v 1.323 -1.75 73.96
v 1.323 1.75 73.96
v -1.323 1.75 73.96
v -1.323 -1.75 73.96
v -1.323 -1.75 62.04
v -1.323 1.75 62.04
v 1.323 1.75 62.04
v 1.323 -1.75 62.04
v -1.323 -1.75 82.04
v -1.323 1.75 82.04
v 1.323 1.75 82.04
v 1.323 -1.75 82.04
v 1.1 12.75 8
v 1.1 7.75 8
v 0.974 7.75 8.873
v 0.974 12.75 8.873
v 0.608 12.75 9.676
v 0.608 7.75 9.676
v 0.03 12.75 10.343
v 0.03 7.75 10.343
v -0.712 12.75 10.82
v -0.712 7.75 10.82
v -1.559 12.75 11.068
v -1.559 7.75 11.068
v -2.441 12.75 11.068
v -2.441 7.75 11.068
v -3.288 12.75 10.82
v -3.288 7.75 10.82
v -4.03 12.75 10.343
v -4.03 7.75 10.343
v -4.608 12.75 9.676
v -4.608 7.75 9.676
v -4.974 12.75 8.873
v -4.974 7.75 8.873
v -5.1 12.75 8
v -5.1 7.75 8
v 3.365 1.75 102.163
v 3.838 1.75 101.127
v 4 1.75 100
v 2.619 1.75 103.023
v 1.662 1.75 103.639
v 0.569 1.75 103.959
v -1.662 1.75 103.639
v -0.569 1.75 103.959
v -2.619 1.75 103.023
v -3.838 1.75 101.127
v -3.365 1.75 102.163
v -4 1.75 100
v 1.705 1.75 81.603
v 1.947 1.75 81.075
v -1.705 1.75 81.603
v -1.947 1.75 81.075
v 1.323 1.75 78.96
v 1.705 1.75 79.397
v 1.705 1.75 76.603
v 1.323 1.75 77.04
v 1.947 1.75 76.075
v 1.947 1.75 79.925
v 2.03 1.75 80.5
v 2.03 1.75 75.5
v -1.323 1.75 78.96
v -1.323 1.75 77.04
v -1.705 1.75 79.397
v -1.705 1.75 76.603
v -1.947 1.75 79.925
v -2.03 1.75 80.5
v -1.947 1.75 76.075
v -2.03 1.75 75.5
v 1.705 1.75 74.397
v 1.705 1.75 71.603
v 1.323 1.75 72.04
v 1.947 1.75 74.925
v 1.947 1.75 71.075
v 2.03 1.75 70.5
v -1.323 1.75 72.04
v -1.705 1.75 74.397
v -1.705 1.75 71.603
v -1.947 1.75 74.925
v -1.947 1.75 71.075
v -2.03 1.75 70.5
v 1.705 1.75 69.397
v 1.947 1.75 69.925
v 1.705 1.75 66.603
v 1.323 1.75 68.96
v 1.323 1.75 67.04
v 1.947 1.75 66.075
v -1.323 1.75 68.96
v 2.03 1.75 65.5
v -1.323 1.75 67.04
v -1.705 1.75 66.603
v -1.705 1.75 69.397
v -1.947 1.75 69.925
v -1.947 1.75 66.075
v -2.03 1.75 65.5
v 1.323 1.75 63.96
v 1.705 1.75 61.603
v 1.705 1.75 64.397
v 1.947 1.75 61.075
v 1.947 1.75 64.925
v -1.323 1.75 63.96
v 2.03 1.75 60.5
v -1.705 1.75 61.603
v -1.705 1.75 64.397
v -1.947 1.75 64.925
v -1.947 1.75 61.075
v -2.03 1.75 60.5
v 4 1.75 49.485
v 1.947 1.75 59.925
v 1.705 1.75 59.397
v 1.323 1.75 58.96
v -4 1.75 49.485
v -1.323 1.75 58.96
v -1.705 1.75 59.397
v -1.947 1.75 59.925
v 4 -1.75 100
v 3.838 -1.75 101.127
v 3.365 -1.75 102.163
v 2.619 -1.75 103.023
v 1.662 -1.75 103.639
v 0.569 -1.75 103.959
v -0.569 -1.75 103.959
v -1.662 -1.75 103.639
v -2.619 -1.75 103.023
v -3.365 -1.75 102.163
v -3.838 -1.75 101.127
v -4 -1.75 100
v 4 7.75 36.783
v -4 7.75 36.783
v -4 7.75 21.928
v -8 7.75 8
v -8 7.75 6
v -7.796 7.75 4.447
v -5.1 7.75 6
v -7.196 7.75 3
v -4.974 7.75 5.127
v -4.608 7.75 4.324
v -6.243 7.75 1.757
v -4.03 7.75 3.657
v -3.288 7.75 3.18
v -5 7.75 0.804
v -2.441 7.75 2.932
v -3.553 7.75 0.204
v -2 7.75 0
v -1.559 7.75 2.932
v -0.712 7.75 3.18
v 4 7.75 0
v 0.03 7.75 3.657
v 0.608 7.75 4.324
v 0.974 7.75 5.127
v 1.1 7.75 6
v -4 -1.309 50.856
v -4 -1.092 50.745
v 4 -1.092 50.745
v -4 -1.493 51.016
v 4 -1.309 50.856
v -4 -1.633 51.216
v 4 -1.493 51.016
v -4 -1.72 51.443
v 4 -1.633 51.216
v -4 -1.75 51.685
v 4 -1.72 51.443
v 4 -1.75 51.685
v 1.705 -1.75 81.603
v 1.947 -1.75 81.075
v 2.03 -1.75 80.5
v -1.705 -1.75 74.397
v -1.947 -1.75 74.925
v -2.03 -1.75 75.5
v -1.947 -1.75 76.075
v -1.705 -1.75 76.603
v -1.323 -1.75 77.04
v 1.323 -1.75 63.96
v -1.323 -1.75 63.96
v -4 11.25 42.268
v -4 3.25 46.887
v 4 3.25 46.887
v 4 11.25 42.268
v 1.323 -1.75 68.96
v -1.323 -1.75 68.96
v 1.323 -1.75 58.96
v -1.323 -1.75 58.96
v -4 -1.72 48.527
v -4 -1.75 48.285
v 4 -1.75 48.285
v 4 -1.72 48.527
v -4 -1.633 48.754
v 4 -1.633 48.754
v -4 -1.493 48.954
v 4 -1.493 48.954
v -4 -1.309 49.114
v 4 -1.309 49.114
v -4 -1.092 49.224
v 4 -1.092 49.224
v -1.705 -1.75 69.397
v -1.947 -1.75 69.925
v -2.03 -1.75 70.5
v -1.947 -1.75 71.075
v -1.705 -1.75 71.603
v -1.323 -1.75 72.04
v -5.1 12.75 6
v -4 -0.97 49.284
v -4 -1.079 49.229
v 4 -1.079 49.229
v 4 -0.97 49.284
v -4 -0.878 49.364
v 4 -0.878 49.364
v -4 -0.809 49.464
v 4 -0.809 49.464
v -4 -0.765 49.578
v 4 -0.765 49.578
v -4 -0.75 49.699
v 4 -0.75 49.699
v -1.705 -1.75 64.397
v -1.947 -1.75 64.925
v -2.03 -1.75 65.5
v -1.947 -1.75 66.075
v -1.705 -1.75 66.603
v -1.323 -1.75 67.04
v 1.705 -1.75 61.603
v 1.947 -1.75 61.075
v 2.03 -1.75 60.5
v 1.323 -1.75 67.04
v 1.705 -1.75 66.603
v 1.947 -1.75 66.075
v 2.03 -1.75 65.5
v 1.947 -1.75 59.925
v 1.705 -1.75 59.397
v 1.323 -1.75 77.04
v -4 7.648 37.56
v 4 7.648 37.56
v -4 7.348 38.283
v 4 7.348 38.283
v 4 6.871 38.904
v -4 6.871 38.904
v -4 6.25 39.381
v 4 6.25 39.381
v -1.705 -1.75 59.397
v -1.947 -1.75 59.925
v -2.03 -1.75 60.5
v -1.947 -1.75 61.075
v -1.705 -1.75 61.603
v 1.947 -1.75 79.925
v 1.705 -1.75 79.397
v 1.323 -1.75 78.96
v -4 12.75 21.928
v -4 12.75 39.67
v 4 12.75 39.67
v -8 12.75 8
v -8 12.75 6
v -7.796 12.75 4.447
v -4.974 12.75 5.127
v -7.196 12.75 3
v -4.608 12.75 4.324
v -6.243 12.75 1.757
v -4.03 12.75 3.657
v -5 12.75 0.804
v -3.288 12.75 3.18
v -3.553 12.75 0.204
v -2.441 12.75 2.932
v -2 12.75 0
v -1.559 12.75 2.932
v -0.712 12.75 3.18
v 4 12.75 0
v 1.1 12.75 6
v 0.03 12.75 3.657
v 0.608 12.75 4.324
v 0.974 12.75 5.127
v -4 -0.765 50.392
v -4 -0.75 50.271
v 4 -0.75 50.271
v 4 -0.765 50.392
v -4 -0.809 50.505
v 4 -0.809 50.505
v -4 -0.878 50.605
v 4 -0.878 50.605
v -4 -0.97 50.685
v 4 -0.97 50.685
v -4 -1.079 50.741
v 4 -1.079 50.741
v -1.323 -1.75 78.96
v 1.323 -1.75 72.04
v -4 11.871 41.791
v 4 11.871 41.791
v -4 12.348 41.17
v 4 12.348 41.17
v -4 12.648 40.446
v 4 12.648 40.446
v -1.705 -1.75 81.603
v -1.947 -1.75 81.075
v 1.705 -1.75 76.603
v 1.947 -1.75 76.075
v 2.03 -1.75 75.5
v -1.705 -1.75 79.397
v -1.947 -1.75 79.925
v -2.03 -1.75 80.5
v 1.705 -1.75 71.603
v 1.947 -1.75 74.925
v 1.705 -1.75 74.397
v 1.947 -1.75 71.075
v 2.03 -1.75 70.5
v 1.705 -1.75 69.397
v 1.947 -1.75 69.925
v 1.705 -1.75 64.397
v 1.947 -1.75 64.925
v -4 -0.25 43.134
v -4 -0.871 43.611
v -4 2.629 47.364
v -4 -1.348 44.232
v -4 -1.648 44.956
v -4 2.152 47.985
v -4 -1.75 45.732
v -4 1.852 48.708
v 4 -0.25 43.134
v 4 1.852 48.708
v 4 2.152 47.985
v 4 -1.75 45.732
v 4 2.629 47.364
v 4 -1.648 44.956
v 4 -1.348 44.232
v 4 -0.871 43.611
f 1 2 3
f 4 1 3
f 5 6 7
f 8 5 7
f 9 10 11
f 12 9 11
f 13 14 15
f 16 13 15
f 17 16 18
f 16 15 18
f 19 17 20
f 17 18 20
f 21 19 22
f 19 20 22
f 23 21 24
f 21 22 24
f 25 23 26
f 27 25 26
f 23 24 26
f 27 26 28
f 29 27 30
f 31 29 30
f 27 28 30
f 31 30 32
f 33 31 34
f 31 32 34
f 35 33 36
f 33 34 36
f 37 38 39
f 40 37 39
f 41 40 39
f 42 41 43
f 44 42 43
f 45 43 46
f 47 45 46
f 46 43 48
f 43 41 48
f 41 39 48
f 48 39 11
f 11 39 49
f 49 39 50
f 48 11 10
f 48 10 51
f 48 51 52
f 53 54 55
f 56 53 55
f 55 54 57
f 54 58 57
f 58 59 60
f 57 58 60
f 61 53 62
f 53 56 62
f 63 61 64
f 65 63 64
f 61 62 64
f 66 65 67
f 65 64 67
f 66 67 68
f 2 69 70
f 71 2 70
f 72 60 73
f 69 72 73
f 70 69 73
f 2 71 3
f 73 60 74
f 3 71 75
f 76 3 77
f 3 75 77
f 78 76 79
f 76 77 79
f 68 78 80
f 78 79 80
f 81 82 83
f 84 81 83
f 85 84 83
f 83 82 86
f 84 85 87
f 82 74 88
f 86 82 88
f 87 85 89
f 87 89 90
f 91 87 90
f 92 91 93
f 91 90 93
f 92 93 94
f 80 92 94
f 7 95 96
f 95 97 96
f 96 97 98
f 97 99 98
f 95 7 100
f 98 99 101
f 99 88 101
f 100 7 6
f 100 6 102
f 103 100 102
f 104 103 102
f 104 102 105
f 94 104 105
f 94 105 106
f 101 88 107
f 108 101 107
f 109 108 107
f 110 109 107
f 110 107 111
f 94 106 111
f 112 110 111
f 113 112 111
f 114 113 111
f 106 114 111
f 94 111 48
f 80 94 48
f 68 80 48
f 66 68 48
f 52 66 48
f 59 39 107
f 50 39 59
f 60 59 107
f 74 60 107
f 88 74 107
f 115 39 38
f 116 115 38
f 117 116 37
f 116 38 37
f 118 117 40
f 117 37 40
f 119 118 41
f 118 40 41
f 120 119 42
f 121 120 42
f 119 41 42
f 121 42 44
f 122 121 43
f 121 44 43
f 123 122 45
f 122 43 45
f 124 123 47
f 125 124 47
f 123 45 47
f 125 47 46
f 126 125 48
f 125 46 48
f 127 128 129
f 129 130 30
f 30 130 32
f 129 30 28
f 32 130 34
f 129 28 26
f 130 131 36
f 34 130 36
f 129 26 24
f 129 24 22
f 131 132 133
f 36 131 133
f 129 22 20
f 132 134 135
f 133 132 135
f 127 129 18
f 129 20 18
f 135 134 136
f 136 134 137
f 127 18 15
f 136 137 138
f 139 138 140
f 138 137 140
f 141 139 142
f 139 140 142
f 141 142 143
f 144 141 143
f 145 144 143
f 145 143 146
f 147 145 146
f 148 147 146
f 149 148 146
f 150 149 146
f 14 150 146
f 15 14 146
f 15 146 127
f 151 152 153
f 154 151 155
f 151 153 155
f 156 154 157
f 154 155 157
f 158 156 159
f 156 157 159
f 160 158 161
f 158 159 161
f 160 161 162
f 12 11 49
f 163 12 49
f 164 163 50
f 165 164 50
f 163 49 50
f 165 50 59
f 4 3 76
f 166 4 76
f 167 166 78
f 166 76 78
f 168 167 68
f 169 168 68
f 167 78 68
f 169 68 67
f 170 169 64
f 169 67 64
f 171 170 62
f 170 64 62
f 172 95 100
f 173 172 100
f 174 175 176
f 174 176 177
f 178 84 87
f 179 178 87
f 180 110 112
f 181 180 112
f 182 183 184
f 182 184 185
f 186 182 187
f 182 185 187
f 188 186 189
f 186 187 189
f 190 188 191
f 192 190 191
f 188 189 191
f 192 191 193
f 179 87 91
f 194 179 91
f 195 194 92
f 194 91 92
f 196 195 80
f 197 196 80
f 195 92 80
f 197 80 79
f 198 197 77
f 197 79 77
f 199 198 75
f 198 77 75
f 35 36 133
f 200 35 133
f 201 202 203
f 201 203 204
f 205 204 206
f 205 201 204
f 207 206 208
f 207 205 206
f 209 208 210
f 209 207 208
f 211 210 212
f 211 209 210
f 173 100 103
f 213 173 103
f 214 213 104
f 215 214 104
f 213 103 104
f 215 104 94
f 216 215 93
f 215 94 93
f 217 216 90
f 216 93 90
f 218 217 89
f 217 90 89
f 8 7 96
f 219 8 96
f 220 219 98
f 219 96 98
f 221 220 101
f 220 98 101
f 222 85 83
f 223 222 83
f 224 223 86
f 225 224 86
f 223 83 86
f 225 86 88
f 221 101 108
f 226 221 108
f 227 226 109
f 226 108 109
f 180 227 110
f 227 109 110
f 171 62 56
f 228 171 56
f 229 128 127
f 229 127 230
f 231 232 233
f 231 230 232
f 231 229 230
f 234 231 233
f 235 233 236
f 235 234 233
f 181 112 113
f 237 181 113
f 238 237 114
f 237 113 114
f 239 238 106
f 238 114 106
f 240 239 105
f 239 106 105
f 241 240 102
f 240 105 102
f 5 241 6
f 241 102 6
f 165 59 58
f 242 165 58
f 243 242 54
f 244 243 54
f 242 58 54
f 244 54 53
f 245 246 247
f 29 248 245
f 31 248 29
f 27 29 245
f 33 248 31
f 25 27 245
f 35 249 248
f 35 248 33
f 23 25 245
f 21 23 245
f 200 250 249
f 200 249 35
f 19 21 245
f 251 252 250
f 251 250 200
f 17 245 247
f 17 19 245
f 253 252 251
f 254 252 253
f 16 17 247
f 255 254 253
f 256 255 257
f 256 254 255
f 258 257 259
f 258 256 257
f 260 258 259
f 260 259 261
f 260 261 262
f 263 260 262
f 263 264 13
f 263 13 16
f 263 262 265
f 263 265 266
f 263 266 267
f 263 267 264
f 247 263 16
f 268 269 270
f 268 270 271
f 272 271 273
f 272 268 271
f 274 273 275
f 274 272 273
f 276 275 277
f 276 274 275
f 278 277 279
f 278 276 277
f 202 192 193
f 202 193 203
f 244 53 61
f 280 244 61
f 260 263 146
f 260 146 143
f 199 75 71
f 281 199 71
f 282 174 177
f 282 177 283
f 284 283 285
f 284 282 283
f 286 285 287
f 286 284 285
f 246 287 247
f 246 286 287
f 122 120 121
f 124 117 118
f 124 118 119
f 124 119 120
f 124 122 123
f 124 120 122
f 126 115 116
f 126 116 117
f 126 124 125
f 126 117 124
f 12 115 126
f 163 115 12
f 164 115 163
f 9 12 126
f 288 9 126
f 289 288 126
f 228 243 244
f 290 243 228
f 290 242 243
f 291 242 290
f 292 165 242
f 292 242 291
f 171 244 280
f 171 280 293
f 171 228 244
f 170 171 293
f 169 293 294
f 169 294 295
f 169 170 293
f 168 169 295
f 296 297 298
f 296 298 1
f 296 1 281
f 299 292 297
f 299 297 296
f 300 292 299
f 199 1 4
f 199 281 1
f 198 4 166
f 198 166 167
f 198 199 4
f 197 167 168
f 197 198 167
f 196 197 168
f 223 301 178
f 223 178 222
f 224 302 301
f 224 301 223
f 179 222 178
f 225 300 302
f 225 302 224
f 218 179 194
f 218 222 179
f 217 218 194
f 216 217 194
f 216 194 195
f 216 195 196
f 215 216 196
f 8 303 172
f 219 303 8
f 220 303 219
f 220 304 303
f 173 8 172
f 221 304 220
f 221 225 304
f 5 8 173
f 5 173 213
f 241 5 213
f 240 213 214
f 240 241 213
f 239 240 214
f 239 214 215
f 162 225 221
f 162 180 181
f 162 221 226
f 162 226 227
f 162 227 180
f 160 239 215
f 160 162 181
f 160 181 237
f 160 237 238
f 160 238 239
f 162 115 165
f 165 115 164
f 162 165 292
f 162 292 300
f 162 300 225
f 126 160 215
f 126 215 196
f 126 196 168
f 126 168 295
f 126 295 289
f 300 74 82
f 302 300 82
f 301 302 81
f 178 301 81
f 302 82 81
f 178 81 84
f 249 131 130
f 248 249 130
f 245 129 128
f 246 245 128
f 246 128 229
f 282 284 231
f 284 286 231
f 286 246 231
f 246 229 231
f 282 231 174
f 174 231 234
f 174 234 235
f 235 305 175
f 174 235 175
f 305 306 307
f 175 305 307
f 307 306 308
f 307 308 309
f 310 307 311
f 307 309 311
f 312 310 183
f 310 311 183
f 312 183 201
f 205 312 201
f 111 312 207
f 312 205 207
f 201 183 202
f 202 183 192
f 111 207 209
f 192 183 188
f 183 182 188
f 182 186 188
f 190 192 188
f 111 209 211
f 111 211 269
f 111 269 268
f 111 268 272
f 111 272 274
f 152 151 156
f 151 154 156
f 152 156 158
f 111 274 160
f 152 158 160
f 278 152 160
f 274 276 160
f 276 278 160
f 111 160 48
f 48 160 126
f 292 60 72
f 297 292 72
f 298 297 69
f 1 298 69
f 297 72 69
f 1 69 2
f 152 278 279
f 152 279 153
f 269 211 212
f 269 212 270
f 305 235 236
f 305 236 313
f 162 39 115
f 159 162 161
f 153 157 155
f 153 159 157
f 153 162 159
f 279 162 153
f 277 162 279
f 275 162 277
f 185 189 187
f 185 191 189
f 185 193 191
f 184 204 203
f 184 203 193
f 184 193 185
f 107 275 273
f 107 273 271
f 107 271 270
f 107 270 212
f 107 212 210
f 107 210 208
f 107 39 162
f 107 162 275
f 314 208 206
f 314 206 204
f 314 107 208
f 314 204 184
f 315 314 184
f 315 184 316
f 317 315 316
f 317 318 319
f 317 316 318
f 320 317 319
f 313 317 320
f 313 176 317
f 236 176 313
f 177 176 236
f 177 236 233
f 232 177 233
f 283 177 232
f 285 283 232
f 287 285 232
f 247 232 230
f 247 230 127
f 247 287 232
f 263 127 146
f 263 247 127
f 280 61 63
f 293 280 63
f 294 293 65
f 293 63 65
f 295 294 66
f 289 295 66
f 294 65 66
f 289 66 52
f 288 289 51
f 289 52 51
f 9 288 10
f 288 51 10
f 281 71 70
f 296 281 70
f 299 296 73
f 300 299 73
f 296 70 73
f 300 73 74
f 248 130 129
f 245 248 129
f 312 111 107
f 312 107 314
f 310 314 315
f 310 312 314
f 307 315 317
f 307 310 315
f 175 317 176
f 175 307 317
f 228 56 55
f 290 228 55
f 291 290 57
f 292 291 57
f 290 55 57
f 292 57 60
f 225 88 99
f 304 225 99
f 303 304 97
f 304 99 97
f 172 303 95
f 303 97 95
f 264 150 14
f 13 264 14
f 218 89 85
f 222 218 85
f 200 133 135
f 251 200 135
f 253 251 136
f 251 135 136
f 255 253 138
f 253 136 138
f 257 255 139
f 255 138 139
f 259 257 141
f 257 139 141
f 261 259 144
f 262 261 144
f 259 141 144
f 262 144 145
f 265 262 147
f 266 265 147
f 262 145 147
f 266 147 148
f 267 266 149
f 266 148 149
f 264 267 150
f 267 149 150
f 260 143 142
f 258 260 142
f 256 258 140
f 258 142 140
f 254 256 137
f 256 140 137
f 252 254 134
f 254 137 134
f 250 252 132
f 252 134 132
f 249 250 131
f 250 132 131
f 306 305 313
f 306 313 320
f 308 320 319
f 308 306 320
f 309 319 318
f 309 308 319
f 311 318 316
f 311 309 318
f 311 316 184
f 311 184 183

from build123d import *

# Parameters (mm, degrees)
SKETCH1_W                = 8
SKETCH1_H                = 3.5
BASE_DEPTH               = 50
SKETCH3_W                = 8
SKETCH3_H                = 3.5
SEGMENT1_DEPTH           = 50
BOSS_EXTRUDE7_DEPTH      = 3.5
BOSS_EXTRUDE9_DEPTH      = 11
CUT_EXTRUDE10_DEPTH      = 101.920760996
CUT_EXTRUDE10_DEPTH_BACK = 101.920760996
CUT_EXTRUDE9_DEPTH       = 102.52124162
CUT_EXTRUDE9_DEPTH_BACK  = 102.52124162
BOSS_EXTRUDE13_DEPTH     = 3.5
CUT_EXTRUDE12_DEPTH      = 10
CUT_EXTRUDE13_DEPTH      = 105.885652022
LPATTERN3_COUNT          = 5
LPATTERN3_PITCH          = 5
BOSS_EXTRUDE14_DEPTH     = 5
FILLET5_R                = 1


with BuildPart() as part:
    # Sketch1 → Base (new body)
    with BuildSketch(Plane.XY):
        Rectangle(SKETCH1_W, SKETCH1_H)
    extrude(amount=BASE_DEPTH)

    # Sketch3 → Segment1 (add)
    with BuildSketch(Plane(origin=(0, 0, 50), x_dir=(-1, 0, 0), z_dir=(0, 0, 1))):
        Rectangle(SKETCH3_W, SKETCH3_H)
    extrude(amount=SEGMENT1_DEPTH)

    # Sketch12 → Boss-Extrude7 (add)
    with BuildSketch(Plane(origin=(0, 1.75, 0), x_dir=(1, 0, 0), z_dir=(0, 1, 0))):
        Polygon((-4, 0), (-8, 0), (-8, -7), (-4, -21.92820323), align=None)
    extrude(amount=-BOSS_EXTRUDE7_DEPTH)

    # Sketch14 → Boss-Extrude9 (add)
    with BuildSketch(Plane(origin=(0, 1.75, 0), x_dir=(1, 0, 0), z_dir=(0, 1, 0))):
        with BuildLine():
            Line((4, -50), (4, -2))
            Line((4, -2), (0, 0))
            Line((0, 0), (-2, 0))
            ThreePointArc((-2, 0), (-6.242640687, -1.757359313), (-8, -6))
            Line((-8, -6), (-8, -8))
            Line((-8, -8), (-4, -21.92820323))
            Line((-4, -21.92820323), (-4, -50))
            Line((-4, -50), (4, -50))
        make_face()
        with BuildLine():
            ThreePointArc((-5.1, -6), (-2, -2.9), (1.1, -6))
            Line((1.1, -6), (1.1, -8))
            ThreePointArc((1.1, -8), (-2, -11.1), (-5.1, -8))
            Line((-5.1, -8), (-5.1, -6))
        make_face(mode=Mode.SUBTRACT)
    extrude(amount=BOSS_EXTRUDE9_DEPTH)

    # Sketch14<2> → Cut-Extrude10 (cut, two sides: drawn at the far end of the back side and taken through both)
    with BuildSketch(Plane(origin=(0, 1.75, 0), x_dir=(1, 0, 0), z_dir=(0, 1, 0)).offset(-CUT_EXTRUDE10_DEPTH_BACK)):
        Polygon((0, 0), (4, -2), (4, 0), align=None)
        with BuildLine():
            ThreePointArc((-8, -6), (-6.242640687, -1.757359313), (-2, 0))
            Line((-2, 0), (-8, 0))
            Line((-8, 0), (-8, -6))
        make_face()
        with BuildLine():
            ThreePointArc((1.1, -6), (-2, -2.9), (-5.1, -6))
            Line((-5.1, -6), (-5.1, -8))
            ThreePointArc((-5.1, -8), (-2, -11.1), (1.1, -8))
            Line((1.1, -8), (1.1, -6))
        make_face()
    extrude(amount=CUT_EXTRUDE10_DEPTH + CUT_EXTRUDE10_DEPTH_BACK, mode=Mode.SUBTRACT)

    # Sketch16 → Cut-Extrude9 (cut, two sides: drawn at the far end of the back side and taken through both)
    with BuildSketch(Plane(origin=(4, 0, 0), x_dir=(0, 0, -1), z_dir=(1, 0, 0)).offset(-CUT_EXTRUDE9_DEPTH_BACK)):
        with BuildLine():
            Line((-50, 12.75), (-50, 1.75))
            Line((-50, 1.75), (-49.484827557, 1.75))
            ThreePointArc((-49.484827557, 1.75), (-47.984827557, 2.151923789), (-46.886751346, 3.25))
            Line((-46.886751346, 3.25), (-42.267949192, 11.25))
            ThreePointArc((-42.267949192, 11.25), (-41.169872981, 12.348076211), (-39.669872981, 12.75))
            Line((-39.669872981, 12.75), (-50, 12.75))
        make_face()
        with BuildLine():
            ThreePointArc((-43.133974596, -0.25), (-44.232050808, -1.348076211), (-45.732050808, -1.75))
            Line((-45.732050808, -1.75), (0, -1.75))
            Line((0, -1.75), (0, 7.75))
            Line((0, 7.75), (-36.783121635, 7.75))
            ThreePointArc((-36.783121635, 7.75), (-38.283121635, 7.348076211), (-39.381197846, 6.25))
            Line((-39.381197846, 6.25), (-43.133974596, -0.25))
        make_face()
    extrude(amount=CUT_EXTRUDE9_DEPTH + CUT_EXTRUDE9_DEPTH_BACK, mode=Mode.SUBTRACT)

    # Sketch22 → Boss-Extrude13 (add)
    with BuildSketch(Plane(origin=(0, 1.75, 0), x_dir=(1, 0, 0), z_dir=(0, 1, 0))):
        with BuildLine():
            Line((-4, -100), (4, -100))
            ThreePointArc((4, -100), (0, -104), (-4, -100))
        make_face()
    extrude(amount=-BOSS_EXTRUDE13_DEPTH)

    # Sketch23 → Cut-Extrude12 (cut)
    with BuildSketch(Plane.ZY.offset(4)):
        with BuildLine():
            Line((49.698901561, -0.75), (50.270753554, -0.75))
            ThreePointArc((50.270753554, -0.75), (50.557541772, -0.840423978), (50.740599864, -1.078989928))
            Line((50.740599864, -1.078989928), (50.984827557, -1.75))
            Line((50.984827557, -1.75), (48.984827557, -1.75))
            Line((48.984827557, -1.75), (49.22905525, -1.078989928))
            ThreePointArc((49.22905525, -1.078989928), (49.412113342, -0.840423978), (49.698901561, -0.75))
        make_face()
    extrude(amount=-CUT_EXTRUDE12_DEPTH, mode=Mode.SUBTRACT)

    # Sketch24 → Cut-Extrude13 (cut, symmetric)
    with BuildSketch(Plane(origin=(0, 1.75, 0), x_dir=(1, 0, 0), z_dir=(0, 1, 0))):
        with BuildLine():
            Line((1.322611054, -58.96), (-1.322611054, -58.96))
            ThreePointArc((-1.322611054, -58.96), (-2.03, -60.5), (-1.322611054, -62.04))
            Line((-1.322611054, -62.04), (1.322611054, -62.04))
            ThreePointArc((1.322611054, -62.04), (1.844695156, -61.347348677), (2.03, -60.5))
            ThreePointArc((2.03, -60.5), (1.844695156, -59.652651323), (1.322611054, -58.96))
        make_face()
    cut_extrude13 = extrude(amount=CUT_EXTRUDE13_DEPTH, both=True, mode=Mode.SUBTRACT)

    # LPattern3: Cut-Extrude13 ×5
    with Locations(*[(0, 0, i * LPATTERN3_PITCH) for i in range(1, LPATTERN3_COUNT)]):
        add(cut_extrude13, mode=Mode.SUBTRACT)

    # Sketch25 → Boss-Extrude14 (add)
    with BuildSketch(Plane(origin=(0, 12.75, 0), x_dir=(1, 0, 0), z_dir=(0, 1, 0))):
        Polygon((4, -2), (4, 0), (0, 0), align=None)
    extrude(amount=-BOSS_EXTRUDE14_DEPTH)

    # Fillet5
    fillet5_edges = [part.edges().sort_by_distance(p)[0] for p in [
        (0, -1.75, 50.984827557),
        (0, -1.75, 48.984827557),
    ]]
    fillet(fillet5_edges, radius=FILLET5_R)


solid = part.part
